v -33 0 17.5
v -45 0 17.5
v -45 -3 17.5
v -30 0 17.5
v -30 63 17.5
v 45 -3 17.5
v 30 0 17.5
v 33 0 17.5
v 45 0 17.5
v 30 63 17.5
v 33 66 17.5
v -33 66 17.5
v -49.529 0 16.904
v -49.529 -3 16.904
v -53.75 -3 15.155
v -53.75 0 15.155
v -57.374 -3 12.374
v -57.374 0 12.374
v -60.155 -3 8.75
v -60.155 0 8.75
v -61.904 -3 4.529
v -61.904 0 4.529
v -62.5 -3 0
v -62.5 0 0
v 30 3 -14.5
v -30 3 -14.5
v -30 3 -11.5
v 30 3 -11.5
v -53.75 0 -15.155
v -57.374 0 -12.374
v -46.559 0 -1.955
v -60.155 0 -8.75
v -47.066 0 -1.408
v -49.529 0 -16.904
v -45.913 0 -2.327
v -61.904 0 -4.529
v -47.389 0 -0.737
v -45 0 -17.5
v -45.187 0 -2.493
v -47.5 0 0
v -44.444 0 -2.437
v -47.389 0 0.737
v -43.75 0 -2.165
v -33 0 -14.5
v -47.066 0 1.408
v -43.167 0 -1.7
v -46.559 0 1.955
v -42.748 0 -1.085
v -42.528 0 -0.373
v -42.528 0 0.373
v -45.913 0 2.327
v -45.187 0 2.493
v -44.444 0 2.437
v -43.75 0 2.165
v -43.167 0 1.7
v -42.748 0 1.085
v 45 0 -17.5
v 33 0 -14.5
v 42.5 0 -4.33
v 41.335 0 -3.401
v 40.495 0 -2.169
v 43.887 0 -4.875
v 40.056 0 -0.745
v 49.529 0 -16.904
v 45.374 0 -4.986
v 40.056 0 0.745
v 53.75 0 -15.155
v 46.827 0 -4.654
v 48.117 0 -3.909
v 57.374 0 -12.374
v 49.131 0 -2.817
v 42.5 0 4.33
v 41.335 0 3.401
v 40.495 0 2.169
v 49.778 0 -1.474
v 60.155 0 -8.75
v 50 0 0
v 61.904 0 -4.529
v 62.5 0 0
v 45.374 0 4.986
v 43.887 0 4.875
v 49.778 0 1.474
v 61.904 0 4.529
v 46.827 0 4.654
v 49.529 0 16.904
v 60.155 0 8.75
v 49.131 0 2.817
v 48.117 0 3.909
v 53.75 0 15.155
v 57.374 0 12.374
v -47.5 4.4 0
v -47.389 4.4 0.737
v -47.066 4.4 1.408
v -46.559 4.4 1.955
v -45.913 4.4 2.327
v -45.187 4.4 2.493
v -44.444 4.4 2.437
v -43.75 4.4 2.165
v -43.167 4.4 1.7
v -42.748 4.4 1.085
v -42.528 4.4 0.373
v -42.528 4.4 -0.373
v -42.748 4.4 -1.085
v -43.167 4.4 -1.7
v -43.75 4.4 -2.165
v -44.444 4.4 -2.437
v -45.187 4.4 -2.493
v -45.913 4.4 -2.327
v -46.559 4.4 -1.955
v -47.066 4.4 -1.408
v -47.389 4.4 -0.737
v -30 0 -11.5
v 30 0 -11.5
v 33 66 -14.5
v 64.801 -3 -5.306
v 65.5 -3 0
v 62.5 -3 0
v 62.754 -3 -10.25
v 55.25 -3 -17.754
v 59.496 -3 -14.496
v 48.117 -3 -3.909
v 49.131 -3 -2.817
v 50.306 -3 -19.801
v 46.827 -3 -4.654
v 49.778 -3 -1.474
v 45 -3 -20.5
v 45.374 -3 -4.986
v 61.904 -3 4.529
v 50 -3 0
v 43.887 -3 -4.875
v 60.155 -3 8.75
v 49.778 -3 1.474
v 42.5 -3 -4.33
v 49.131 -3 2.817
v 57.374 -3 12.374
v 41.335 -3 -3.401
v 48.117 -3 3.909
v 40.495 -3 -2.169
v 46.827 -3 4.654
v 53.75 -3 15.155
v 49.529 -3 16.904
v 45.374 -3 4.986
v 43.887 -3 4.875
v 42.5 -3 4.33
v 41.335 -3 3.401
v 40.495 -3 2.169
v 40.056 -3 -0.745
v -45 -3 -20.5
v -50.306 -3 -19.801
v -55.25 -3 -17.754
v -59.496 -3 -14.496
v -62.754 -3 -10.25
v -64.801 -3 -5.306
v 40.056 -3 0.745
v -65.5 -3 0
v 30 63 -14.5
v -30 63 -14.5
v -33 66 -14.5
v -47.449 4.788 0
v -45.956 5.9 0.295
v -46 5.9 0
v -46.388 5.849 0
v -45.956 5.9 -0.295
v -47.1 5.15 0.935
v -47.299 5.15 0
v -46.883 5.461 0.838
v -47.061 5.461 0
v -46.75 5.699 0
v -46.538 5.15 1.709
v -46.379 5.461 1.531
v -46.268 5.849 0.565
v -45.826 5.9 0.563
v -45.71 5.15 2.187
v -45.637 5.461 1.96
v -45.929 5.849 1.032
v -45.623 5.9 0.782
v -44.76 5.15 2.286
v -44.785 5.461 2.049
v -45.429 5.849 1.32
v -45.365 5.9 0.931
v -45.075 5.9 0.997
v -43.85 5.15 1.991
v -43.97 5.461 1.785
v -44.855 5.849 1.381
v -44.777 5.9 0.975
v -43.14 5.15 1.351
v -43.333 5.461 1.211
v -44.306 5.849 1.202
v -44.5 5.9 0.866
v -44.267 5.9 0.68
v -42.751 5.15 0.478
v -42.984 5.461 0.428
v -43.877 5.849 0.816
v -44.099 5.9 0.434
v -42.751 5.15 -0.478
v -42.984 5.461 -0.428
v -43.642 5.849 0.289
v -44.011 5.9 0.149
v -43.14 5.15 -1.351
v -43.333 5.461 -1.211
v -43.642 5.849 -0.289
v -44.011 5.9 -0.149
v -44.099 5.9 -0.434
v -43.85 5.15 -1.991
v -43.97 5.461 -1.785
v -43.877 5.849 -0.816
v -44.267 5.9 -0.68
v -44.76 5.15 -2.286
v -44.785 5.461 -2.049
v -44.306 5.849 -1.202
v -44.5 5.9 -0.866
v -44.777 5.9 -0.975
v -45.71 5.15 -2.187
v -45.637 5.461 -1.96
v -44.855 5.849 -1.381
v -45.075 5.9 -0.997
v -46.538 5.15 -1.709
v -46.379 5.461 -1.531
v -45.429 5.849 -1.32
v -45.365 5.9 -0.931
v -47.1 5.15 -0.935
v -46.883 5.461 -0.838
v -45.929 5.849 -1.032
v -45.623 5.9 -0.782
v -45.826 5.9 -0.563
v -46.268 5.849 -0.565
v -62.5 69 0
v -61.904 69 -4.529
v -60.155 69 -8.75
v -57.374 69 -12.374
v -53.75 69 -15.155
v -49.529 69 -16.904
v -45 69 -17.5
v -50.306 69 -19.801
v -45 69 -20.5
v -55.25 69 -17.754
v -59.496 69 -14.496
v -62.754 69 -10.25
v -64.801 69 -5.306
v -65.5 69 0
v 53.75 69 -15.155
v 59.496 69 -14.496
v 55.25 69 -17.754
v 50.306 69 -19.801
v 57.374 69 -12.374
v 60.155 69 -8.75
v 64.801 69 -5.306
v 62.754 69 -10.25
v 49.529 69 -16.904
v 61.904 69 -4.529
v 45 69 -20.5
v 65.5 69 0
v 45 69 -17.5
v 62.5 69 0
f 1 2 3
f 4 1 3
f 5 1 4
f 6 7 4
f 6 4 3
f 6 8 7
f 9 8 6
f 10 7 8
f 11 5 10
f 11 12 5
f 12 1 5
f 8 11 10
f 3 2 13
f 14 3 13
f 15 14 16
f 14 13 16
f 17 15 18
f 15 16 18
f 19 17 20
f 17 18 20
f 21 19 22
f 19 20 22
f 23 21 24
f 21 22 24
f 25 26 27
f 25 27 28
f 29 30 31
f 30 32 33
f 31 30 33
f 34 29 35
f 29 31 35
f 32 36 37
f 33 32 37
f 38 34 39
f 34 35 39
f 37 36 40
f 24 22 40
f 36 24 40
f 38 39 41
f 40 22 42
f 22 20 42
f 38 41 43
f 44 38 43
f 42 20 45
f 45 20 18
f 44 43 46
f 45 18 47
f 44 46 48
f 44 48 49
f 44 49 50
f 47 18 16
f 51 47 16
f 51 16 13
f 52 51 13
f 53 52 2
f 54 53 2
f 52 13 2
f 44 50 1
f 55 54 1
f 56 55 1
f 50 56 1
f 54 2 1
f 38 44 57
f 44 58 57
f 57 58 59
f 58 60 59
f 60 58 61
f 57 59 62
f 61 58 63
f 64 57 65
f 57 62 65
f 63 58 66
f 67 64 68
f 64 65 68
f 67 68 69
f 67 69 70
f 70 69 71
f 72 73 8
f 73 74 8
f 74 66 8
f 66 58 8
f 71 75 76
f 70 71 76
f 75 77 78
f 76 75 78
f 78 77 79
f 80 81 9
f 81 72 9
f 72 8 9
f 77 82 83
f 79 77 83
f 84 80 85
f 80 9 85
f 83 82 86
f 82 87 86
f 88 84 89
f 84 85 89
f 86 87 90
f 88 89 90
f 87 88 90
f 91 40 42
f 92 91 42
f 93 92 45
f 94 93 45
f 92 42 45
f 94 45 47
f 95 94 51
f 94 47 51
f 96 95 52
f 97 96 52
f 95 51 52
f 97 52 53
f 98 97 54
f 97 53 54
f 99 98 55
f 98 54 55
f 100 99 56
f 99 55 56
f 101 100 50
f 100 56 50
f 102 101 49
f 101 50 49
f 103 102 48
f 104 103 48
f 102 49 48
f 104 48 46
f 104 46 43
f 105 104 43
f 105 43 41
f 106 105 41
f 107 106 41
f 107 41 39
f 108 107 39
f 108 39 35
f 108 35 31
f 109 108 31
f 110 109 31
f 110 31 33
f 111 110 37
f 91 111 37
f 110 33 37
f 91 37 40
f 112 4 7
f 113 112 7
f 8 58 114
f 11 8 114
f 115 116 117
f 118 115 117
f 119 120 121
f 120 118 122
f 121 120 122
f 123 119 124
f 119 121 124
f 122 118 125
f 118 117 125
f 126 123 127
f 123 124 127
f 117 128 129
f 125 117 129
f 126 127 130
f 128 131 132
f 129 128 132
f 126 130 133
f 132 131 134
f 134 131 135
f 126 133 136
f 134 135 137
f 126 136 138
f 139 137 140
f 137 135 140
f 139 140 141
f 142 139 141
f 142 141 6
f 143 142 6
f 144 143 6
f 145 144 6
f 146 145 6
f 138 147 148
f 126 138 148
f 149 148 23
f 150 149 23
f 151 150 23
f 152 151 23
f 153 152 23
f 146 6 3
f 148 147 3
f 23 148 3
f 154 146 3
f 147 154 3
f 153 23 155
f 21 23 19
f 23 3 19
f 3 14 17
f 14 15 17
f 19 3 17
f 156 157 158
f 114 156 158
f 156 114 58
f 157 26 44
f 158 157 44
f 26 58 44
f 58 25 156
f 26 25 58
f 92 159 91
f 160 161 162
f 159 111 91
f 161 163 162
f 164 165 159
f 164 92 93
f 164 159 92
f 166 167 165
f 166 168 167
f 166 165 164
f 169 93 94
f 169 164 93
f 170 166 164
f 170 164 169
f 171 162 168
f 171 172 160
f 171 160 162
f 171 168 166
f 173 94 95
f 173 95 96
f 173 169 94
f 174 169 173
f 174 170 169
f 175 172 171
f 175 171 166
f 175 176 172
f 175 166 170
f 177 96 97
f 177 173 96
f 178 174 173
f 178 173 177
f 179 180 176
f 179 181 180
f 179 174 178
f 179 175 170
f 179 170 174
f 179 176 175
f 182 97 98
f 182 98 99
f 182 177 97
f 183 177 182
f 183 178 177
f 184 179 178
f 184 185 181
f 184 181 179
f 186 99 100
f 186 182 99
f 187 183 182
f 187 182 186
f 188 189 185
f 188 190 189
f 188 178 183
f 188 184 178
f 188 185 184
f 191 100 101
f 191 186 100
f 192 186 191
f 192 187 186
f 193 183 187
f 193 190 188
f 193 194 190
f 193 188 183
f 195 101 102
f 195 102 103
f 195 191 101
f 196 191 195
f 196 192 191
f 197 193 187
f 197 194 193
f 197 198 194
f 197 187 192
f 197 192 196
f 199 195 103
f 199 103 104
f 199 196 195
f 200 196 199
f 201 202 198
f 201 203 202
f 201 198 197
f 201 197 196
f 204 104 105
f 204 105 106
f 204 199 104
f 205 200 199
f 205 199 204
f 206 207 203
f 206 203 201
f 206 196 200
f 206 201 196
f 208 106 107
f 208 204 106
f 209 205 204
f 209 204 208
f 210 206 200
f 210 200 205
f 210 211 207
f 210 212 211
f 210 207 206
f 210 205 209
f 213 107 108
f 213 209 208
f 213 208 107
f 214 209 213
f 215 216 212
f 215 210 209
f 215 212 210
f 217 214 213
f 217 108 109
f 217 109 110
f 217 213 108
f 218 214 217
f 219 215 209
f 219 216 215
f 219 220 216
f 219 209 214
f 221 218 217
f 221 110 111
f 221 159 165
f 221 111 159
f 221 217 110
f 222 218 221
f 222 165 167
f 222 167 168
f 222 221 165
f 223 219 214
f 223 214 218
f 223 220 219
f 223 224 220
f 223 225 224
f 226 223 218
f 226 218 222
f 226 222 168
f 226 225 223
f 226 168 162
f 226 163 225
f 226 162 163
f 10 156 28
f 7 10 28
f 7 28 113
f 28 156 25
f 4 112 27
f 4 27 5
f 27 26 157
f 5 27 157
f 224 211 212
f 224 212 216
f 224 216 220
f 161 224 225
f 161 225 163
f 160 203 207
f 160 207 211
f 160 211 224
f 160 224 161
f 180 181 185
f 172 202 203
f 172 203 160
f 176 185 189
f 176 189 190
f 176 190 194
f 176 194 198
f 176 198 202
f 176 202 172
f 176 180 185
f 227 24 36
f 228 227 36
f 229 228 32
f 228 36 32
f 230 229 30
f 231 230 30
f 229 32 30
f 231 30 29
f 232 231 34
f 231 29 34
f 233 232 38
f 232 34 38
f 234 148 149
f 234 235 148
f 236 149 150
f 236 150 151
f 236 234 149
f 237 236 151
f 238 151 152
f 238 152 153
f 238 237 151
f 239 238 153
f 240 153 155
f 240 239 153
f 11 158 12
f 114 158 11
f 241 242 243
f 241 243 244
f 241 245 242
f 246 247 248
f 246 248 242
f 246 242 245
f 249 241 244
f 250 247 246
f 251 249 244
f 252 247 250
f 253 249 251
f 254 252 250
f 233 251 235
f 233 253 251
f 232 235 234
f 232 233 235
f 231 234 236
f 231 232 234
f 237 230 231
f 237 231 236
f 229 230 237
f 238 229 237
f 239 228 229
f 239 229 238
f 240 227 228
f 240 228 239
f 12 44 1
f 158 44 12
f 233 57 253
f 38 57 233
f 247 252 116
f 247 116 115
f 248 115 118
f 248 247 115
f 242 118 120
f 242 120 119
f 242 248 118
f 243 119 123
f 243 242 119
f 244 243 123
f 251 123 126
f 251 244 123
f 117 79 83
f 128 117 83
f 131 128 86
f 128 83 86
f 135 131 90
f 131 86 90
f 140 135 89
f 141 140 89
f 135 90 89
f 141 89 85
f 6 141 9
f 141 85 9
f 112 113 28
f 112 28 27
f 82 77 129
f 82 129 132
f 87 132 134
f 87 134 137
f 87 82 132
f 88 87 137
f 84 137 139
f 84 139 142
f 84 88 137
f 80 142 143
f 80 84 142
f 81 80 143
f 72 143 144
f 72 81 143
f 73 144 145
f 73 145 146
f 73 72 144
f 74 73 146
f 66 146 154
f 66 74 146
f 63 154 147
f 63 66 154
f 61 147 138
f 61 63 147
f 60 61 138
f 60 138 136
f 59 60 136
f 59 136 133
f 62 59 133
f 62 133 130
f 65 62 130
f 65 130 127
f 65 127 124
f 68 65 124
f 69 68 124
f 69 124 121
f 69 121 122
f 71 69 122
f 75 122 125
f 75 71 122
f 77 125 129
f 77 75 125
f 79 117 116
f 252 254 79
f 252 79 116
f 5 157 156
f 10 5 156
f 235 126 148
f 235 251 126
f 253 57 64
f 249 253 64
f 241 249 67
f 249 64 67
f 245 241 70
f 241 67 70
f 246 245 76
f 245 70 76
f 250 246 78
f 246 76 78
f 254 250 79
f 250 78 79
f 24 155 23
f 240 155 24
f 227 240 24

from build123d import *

# Parameters (mm, degrees)
F0_R           = 5
F1_DEPTH       = 3
F2_W           = 66
F2_H           = 3
F3_DEPTH       = 66
F4_W           = 60
F4_H           = 60
F5_DEPTH       = 25
F6_R           = 2.5
F7_DEPTH       = 5.9
F8_R           = 1.5
F9_W           = 90
F9_H           = 3
F10_DEPTH      = 69
F10_DEPTH_BACK = 3
F11_W          = 66
F11_H          = 3
F12_DEPTH      = 29
F13_W          = 3
F13_H          = 63
F14_DEPTH      = 29


with BuildPart() as f1:
    # F0 (on Front) → F1 (new body)
    with BuildSketch(Plane.XZ):
        with BuildLine():
            ThreePointArc((45, -17.5), (62.5, 0), (45, 17.5))
            Line((45, 17.5), (-45, 17.5))
            ThreePointArc((-45, 17.5), (-62.5, 0), (-45, -17.5))
            Line((-45, -17.5), (45, -17.5))
        make_face()
        with Locations((45, 0)):
            Circle(F0_R, mode=Mode.SUBTRACT)
    extrude(amount=F1_DEPTH)

    # F2 (on face) → F3 (join)
    with BuildSketch(Plane(origin=(0, 0, 0), x_dir=(-1, 0, 0), z_dir=(0, 1, 0))):
        with Locations((0, -13)):
            Rectangle(F2_W, F2_H)
    extrude(amount=F3_DEPTH)

    # F4 (on face) → F5 (cut)
    with BuildSketch(Plane(origin=(0, 0, -14.5), x_dir=(1, 0, 0), z_dir=(0, 0, -1))):
        with Locations((0, -33)):
            Rectangle(F4_W, F4_H)
    extrude(amount=-F5_DEPTH, mode=Mode.SUBTRACT)

    # F6 (on face) → F7 (join)
    with BuildSketch(Plane(origin=(0, 0, 0), x_dir=(-1, 0, 0), z_dir=(0, 1, 0))):
        with Locations((45, 0)):
            Circle(F6_R)
    extrude(amount=F7_DEPTH)

    # F8
    f8_edges = [f1.edges().sort_by_distance(p)[0] for p in [
        (-42.5, 5.9, 0),
    ]]
    fillet(f8_edges, radius=F8_R)

    # F9 (on face) → F10 (join, two sides)
    with BuildSketch(Plane(origin=(0, 0, 0), x_dir=(-1, 0, 0), z_dir=(0, 1, 0))) as f10_sk:
        with BuildLine():
            Line((65.5, 0), (62.5, 0))
            ThreePointArc((62.5, 0), (57.374369, -12.374369), (45, -17.5))
            Line((45, -17.5), (45, -20.5))
            ThreePointArc((45, -20.5), (59.495689, -14.495689), (65.5, 0))
        make_face()
        with Locations((0, -19)):
            Rectangle(F9_W, F9_H)
        with BuildLine():
            Line((-45, -20.5), (-45, -17.5))
            ThreePointArc((-45, -17.5), (-57.374369, -12.374369), (-62.5, 0))
            Line((-62.5, 0), (-65.5, 0))
            ThreePointArc((-65.5, 0), (-59.495689, -14.495689), (-45, -20.5))
        make_face()
    extrude(amount=F10_DEPTH)
    extrude(f10_sk.sketch, amount=-F10_DEPTH_BACK)

    # F11 (on face) → F12 (join)
    with BuildSketch(Plane.XY.offset(-11.5)):
        with Locations((0, 64.5)):
            Rectangle(F11_W, F11_H)
    extrude(amount=F12_DEPTH)

    # F13 (on face) → F14 (join)
    with BuildSketch(Plane.XY.offset(-11.5)):
        with Locations((-31.5, 31.5)):
            Rectangle(F13_W, F13_H)
        with Locations((31.5, 31.5)):
            Rectangle(F13_W, F13_H)
    extrude(amount=F14_DEPTH)


solid = f1.part
